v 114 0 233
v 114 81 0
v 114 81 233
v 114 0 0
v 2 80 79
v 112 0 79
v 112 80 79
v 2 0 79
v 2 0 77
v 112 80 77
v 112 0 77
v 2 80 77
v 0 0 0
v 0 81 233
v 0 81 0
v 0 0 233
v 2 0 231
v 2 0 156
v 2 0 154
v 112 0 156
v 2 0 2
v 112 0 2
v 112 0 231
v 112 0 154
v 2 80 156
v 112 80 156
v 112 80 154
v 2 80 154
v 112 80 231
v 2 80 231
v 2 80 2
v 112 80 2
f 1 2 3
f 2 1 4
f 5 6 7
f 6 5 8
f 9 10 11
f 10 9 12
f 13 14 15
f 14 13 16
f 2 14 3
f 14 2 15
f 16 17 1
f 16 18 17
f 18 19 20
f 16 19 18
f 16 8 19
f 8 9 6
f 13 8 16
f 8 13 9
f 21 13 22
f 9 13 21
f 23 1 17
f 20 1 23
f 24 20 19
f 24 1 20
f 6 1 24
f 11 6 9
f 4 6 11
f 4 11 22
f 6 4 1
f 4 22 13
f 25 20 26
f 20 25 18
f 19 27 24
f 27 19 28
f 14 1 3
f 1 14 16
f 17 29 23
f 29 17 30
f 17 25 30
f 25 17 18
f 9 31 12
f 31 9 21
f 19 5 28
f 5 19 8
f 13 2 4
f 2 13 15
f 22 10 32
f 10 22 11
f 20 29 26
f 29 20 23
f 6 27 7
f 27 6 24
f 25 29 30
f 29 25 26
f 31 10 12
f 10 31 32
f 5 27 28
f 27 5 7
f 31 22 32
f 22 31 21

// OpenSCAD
canisters = 3;
insideWidth = 110;
insideDepth = 80;
insideHeight = 75;
wallThickness = 2;
backThickness = 1;

// Calculated values
totalHeight = (insideHeight*canisters)+(wallThickness*(canisters+1));
echo()
echo("** Total Height = ", totalHeight, "mm");
echo()

// Left side
cube([
    wallThickness,
    insideDepth+backThickness,
    (insideHeight*canisters)+(wallThickness*(canisters+1))]);
// Right side
translate([insideWidth + wallThickness,0,0]) cube([
    wallThickness,
    insideDepth+backThickness,
    (insideHeight*canisters)+(wallThickness*(canisters+1))]);
// Back
translate([0,insideDepth,0]) cube([
    insideWidth + wallThickness*2,
    backThickness,
    (insideHeight * canisters) + (wallThickness * (canisters+1))]);
// Bottom
cube([
    insideWidth + wallThickness*2,
    insideDepth + backThickness,
    wallThickness
    ]);
// Top
translate([0,0,(insideHeight*canisters)+(wallThickness*(canisters))]) cube([
    insideWidth + wallThickness*2,
    insideDepth + backThickness,
    wallThickness
    ]);
// Inside shelves
for (i = [1 : canisters]) {
    translate([0, 0, i * (insideHeight + wallThickness)]) 
    cube([
        insideWidth + wallThickness*2,
        insideDepth + backThickness,
        wallThickness
        ]);
}


//difference(){
//    //cube([
//    //    insideWidth + wallThickness*2, 
//    //    insideDepth + wallThickness,
//    //    insideHeight + wallThickness*2]);
//    //cube([insideWidth, insideDepth,insideHeight]);
//}
